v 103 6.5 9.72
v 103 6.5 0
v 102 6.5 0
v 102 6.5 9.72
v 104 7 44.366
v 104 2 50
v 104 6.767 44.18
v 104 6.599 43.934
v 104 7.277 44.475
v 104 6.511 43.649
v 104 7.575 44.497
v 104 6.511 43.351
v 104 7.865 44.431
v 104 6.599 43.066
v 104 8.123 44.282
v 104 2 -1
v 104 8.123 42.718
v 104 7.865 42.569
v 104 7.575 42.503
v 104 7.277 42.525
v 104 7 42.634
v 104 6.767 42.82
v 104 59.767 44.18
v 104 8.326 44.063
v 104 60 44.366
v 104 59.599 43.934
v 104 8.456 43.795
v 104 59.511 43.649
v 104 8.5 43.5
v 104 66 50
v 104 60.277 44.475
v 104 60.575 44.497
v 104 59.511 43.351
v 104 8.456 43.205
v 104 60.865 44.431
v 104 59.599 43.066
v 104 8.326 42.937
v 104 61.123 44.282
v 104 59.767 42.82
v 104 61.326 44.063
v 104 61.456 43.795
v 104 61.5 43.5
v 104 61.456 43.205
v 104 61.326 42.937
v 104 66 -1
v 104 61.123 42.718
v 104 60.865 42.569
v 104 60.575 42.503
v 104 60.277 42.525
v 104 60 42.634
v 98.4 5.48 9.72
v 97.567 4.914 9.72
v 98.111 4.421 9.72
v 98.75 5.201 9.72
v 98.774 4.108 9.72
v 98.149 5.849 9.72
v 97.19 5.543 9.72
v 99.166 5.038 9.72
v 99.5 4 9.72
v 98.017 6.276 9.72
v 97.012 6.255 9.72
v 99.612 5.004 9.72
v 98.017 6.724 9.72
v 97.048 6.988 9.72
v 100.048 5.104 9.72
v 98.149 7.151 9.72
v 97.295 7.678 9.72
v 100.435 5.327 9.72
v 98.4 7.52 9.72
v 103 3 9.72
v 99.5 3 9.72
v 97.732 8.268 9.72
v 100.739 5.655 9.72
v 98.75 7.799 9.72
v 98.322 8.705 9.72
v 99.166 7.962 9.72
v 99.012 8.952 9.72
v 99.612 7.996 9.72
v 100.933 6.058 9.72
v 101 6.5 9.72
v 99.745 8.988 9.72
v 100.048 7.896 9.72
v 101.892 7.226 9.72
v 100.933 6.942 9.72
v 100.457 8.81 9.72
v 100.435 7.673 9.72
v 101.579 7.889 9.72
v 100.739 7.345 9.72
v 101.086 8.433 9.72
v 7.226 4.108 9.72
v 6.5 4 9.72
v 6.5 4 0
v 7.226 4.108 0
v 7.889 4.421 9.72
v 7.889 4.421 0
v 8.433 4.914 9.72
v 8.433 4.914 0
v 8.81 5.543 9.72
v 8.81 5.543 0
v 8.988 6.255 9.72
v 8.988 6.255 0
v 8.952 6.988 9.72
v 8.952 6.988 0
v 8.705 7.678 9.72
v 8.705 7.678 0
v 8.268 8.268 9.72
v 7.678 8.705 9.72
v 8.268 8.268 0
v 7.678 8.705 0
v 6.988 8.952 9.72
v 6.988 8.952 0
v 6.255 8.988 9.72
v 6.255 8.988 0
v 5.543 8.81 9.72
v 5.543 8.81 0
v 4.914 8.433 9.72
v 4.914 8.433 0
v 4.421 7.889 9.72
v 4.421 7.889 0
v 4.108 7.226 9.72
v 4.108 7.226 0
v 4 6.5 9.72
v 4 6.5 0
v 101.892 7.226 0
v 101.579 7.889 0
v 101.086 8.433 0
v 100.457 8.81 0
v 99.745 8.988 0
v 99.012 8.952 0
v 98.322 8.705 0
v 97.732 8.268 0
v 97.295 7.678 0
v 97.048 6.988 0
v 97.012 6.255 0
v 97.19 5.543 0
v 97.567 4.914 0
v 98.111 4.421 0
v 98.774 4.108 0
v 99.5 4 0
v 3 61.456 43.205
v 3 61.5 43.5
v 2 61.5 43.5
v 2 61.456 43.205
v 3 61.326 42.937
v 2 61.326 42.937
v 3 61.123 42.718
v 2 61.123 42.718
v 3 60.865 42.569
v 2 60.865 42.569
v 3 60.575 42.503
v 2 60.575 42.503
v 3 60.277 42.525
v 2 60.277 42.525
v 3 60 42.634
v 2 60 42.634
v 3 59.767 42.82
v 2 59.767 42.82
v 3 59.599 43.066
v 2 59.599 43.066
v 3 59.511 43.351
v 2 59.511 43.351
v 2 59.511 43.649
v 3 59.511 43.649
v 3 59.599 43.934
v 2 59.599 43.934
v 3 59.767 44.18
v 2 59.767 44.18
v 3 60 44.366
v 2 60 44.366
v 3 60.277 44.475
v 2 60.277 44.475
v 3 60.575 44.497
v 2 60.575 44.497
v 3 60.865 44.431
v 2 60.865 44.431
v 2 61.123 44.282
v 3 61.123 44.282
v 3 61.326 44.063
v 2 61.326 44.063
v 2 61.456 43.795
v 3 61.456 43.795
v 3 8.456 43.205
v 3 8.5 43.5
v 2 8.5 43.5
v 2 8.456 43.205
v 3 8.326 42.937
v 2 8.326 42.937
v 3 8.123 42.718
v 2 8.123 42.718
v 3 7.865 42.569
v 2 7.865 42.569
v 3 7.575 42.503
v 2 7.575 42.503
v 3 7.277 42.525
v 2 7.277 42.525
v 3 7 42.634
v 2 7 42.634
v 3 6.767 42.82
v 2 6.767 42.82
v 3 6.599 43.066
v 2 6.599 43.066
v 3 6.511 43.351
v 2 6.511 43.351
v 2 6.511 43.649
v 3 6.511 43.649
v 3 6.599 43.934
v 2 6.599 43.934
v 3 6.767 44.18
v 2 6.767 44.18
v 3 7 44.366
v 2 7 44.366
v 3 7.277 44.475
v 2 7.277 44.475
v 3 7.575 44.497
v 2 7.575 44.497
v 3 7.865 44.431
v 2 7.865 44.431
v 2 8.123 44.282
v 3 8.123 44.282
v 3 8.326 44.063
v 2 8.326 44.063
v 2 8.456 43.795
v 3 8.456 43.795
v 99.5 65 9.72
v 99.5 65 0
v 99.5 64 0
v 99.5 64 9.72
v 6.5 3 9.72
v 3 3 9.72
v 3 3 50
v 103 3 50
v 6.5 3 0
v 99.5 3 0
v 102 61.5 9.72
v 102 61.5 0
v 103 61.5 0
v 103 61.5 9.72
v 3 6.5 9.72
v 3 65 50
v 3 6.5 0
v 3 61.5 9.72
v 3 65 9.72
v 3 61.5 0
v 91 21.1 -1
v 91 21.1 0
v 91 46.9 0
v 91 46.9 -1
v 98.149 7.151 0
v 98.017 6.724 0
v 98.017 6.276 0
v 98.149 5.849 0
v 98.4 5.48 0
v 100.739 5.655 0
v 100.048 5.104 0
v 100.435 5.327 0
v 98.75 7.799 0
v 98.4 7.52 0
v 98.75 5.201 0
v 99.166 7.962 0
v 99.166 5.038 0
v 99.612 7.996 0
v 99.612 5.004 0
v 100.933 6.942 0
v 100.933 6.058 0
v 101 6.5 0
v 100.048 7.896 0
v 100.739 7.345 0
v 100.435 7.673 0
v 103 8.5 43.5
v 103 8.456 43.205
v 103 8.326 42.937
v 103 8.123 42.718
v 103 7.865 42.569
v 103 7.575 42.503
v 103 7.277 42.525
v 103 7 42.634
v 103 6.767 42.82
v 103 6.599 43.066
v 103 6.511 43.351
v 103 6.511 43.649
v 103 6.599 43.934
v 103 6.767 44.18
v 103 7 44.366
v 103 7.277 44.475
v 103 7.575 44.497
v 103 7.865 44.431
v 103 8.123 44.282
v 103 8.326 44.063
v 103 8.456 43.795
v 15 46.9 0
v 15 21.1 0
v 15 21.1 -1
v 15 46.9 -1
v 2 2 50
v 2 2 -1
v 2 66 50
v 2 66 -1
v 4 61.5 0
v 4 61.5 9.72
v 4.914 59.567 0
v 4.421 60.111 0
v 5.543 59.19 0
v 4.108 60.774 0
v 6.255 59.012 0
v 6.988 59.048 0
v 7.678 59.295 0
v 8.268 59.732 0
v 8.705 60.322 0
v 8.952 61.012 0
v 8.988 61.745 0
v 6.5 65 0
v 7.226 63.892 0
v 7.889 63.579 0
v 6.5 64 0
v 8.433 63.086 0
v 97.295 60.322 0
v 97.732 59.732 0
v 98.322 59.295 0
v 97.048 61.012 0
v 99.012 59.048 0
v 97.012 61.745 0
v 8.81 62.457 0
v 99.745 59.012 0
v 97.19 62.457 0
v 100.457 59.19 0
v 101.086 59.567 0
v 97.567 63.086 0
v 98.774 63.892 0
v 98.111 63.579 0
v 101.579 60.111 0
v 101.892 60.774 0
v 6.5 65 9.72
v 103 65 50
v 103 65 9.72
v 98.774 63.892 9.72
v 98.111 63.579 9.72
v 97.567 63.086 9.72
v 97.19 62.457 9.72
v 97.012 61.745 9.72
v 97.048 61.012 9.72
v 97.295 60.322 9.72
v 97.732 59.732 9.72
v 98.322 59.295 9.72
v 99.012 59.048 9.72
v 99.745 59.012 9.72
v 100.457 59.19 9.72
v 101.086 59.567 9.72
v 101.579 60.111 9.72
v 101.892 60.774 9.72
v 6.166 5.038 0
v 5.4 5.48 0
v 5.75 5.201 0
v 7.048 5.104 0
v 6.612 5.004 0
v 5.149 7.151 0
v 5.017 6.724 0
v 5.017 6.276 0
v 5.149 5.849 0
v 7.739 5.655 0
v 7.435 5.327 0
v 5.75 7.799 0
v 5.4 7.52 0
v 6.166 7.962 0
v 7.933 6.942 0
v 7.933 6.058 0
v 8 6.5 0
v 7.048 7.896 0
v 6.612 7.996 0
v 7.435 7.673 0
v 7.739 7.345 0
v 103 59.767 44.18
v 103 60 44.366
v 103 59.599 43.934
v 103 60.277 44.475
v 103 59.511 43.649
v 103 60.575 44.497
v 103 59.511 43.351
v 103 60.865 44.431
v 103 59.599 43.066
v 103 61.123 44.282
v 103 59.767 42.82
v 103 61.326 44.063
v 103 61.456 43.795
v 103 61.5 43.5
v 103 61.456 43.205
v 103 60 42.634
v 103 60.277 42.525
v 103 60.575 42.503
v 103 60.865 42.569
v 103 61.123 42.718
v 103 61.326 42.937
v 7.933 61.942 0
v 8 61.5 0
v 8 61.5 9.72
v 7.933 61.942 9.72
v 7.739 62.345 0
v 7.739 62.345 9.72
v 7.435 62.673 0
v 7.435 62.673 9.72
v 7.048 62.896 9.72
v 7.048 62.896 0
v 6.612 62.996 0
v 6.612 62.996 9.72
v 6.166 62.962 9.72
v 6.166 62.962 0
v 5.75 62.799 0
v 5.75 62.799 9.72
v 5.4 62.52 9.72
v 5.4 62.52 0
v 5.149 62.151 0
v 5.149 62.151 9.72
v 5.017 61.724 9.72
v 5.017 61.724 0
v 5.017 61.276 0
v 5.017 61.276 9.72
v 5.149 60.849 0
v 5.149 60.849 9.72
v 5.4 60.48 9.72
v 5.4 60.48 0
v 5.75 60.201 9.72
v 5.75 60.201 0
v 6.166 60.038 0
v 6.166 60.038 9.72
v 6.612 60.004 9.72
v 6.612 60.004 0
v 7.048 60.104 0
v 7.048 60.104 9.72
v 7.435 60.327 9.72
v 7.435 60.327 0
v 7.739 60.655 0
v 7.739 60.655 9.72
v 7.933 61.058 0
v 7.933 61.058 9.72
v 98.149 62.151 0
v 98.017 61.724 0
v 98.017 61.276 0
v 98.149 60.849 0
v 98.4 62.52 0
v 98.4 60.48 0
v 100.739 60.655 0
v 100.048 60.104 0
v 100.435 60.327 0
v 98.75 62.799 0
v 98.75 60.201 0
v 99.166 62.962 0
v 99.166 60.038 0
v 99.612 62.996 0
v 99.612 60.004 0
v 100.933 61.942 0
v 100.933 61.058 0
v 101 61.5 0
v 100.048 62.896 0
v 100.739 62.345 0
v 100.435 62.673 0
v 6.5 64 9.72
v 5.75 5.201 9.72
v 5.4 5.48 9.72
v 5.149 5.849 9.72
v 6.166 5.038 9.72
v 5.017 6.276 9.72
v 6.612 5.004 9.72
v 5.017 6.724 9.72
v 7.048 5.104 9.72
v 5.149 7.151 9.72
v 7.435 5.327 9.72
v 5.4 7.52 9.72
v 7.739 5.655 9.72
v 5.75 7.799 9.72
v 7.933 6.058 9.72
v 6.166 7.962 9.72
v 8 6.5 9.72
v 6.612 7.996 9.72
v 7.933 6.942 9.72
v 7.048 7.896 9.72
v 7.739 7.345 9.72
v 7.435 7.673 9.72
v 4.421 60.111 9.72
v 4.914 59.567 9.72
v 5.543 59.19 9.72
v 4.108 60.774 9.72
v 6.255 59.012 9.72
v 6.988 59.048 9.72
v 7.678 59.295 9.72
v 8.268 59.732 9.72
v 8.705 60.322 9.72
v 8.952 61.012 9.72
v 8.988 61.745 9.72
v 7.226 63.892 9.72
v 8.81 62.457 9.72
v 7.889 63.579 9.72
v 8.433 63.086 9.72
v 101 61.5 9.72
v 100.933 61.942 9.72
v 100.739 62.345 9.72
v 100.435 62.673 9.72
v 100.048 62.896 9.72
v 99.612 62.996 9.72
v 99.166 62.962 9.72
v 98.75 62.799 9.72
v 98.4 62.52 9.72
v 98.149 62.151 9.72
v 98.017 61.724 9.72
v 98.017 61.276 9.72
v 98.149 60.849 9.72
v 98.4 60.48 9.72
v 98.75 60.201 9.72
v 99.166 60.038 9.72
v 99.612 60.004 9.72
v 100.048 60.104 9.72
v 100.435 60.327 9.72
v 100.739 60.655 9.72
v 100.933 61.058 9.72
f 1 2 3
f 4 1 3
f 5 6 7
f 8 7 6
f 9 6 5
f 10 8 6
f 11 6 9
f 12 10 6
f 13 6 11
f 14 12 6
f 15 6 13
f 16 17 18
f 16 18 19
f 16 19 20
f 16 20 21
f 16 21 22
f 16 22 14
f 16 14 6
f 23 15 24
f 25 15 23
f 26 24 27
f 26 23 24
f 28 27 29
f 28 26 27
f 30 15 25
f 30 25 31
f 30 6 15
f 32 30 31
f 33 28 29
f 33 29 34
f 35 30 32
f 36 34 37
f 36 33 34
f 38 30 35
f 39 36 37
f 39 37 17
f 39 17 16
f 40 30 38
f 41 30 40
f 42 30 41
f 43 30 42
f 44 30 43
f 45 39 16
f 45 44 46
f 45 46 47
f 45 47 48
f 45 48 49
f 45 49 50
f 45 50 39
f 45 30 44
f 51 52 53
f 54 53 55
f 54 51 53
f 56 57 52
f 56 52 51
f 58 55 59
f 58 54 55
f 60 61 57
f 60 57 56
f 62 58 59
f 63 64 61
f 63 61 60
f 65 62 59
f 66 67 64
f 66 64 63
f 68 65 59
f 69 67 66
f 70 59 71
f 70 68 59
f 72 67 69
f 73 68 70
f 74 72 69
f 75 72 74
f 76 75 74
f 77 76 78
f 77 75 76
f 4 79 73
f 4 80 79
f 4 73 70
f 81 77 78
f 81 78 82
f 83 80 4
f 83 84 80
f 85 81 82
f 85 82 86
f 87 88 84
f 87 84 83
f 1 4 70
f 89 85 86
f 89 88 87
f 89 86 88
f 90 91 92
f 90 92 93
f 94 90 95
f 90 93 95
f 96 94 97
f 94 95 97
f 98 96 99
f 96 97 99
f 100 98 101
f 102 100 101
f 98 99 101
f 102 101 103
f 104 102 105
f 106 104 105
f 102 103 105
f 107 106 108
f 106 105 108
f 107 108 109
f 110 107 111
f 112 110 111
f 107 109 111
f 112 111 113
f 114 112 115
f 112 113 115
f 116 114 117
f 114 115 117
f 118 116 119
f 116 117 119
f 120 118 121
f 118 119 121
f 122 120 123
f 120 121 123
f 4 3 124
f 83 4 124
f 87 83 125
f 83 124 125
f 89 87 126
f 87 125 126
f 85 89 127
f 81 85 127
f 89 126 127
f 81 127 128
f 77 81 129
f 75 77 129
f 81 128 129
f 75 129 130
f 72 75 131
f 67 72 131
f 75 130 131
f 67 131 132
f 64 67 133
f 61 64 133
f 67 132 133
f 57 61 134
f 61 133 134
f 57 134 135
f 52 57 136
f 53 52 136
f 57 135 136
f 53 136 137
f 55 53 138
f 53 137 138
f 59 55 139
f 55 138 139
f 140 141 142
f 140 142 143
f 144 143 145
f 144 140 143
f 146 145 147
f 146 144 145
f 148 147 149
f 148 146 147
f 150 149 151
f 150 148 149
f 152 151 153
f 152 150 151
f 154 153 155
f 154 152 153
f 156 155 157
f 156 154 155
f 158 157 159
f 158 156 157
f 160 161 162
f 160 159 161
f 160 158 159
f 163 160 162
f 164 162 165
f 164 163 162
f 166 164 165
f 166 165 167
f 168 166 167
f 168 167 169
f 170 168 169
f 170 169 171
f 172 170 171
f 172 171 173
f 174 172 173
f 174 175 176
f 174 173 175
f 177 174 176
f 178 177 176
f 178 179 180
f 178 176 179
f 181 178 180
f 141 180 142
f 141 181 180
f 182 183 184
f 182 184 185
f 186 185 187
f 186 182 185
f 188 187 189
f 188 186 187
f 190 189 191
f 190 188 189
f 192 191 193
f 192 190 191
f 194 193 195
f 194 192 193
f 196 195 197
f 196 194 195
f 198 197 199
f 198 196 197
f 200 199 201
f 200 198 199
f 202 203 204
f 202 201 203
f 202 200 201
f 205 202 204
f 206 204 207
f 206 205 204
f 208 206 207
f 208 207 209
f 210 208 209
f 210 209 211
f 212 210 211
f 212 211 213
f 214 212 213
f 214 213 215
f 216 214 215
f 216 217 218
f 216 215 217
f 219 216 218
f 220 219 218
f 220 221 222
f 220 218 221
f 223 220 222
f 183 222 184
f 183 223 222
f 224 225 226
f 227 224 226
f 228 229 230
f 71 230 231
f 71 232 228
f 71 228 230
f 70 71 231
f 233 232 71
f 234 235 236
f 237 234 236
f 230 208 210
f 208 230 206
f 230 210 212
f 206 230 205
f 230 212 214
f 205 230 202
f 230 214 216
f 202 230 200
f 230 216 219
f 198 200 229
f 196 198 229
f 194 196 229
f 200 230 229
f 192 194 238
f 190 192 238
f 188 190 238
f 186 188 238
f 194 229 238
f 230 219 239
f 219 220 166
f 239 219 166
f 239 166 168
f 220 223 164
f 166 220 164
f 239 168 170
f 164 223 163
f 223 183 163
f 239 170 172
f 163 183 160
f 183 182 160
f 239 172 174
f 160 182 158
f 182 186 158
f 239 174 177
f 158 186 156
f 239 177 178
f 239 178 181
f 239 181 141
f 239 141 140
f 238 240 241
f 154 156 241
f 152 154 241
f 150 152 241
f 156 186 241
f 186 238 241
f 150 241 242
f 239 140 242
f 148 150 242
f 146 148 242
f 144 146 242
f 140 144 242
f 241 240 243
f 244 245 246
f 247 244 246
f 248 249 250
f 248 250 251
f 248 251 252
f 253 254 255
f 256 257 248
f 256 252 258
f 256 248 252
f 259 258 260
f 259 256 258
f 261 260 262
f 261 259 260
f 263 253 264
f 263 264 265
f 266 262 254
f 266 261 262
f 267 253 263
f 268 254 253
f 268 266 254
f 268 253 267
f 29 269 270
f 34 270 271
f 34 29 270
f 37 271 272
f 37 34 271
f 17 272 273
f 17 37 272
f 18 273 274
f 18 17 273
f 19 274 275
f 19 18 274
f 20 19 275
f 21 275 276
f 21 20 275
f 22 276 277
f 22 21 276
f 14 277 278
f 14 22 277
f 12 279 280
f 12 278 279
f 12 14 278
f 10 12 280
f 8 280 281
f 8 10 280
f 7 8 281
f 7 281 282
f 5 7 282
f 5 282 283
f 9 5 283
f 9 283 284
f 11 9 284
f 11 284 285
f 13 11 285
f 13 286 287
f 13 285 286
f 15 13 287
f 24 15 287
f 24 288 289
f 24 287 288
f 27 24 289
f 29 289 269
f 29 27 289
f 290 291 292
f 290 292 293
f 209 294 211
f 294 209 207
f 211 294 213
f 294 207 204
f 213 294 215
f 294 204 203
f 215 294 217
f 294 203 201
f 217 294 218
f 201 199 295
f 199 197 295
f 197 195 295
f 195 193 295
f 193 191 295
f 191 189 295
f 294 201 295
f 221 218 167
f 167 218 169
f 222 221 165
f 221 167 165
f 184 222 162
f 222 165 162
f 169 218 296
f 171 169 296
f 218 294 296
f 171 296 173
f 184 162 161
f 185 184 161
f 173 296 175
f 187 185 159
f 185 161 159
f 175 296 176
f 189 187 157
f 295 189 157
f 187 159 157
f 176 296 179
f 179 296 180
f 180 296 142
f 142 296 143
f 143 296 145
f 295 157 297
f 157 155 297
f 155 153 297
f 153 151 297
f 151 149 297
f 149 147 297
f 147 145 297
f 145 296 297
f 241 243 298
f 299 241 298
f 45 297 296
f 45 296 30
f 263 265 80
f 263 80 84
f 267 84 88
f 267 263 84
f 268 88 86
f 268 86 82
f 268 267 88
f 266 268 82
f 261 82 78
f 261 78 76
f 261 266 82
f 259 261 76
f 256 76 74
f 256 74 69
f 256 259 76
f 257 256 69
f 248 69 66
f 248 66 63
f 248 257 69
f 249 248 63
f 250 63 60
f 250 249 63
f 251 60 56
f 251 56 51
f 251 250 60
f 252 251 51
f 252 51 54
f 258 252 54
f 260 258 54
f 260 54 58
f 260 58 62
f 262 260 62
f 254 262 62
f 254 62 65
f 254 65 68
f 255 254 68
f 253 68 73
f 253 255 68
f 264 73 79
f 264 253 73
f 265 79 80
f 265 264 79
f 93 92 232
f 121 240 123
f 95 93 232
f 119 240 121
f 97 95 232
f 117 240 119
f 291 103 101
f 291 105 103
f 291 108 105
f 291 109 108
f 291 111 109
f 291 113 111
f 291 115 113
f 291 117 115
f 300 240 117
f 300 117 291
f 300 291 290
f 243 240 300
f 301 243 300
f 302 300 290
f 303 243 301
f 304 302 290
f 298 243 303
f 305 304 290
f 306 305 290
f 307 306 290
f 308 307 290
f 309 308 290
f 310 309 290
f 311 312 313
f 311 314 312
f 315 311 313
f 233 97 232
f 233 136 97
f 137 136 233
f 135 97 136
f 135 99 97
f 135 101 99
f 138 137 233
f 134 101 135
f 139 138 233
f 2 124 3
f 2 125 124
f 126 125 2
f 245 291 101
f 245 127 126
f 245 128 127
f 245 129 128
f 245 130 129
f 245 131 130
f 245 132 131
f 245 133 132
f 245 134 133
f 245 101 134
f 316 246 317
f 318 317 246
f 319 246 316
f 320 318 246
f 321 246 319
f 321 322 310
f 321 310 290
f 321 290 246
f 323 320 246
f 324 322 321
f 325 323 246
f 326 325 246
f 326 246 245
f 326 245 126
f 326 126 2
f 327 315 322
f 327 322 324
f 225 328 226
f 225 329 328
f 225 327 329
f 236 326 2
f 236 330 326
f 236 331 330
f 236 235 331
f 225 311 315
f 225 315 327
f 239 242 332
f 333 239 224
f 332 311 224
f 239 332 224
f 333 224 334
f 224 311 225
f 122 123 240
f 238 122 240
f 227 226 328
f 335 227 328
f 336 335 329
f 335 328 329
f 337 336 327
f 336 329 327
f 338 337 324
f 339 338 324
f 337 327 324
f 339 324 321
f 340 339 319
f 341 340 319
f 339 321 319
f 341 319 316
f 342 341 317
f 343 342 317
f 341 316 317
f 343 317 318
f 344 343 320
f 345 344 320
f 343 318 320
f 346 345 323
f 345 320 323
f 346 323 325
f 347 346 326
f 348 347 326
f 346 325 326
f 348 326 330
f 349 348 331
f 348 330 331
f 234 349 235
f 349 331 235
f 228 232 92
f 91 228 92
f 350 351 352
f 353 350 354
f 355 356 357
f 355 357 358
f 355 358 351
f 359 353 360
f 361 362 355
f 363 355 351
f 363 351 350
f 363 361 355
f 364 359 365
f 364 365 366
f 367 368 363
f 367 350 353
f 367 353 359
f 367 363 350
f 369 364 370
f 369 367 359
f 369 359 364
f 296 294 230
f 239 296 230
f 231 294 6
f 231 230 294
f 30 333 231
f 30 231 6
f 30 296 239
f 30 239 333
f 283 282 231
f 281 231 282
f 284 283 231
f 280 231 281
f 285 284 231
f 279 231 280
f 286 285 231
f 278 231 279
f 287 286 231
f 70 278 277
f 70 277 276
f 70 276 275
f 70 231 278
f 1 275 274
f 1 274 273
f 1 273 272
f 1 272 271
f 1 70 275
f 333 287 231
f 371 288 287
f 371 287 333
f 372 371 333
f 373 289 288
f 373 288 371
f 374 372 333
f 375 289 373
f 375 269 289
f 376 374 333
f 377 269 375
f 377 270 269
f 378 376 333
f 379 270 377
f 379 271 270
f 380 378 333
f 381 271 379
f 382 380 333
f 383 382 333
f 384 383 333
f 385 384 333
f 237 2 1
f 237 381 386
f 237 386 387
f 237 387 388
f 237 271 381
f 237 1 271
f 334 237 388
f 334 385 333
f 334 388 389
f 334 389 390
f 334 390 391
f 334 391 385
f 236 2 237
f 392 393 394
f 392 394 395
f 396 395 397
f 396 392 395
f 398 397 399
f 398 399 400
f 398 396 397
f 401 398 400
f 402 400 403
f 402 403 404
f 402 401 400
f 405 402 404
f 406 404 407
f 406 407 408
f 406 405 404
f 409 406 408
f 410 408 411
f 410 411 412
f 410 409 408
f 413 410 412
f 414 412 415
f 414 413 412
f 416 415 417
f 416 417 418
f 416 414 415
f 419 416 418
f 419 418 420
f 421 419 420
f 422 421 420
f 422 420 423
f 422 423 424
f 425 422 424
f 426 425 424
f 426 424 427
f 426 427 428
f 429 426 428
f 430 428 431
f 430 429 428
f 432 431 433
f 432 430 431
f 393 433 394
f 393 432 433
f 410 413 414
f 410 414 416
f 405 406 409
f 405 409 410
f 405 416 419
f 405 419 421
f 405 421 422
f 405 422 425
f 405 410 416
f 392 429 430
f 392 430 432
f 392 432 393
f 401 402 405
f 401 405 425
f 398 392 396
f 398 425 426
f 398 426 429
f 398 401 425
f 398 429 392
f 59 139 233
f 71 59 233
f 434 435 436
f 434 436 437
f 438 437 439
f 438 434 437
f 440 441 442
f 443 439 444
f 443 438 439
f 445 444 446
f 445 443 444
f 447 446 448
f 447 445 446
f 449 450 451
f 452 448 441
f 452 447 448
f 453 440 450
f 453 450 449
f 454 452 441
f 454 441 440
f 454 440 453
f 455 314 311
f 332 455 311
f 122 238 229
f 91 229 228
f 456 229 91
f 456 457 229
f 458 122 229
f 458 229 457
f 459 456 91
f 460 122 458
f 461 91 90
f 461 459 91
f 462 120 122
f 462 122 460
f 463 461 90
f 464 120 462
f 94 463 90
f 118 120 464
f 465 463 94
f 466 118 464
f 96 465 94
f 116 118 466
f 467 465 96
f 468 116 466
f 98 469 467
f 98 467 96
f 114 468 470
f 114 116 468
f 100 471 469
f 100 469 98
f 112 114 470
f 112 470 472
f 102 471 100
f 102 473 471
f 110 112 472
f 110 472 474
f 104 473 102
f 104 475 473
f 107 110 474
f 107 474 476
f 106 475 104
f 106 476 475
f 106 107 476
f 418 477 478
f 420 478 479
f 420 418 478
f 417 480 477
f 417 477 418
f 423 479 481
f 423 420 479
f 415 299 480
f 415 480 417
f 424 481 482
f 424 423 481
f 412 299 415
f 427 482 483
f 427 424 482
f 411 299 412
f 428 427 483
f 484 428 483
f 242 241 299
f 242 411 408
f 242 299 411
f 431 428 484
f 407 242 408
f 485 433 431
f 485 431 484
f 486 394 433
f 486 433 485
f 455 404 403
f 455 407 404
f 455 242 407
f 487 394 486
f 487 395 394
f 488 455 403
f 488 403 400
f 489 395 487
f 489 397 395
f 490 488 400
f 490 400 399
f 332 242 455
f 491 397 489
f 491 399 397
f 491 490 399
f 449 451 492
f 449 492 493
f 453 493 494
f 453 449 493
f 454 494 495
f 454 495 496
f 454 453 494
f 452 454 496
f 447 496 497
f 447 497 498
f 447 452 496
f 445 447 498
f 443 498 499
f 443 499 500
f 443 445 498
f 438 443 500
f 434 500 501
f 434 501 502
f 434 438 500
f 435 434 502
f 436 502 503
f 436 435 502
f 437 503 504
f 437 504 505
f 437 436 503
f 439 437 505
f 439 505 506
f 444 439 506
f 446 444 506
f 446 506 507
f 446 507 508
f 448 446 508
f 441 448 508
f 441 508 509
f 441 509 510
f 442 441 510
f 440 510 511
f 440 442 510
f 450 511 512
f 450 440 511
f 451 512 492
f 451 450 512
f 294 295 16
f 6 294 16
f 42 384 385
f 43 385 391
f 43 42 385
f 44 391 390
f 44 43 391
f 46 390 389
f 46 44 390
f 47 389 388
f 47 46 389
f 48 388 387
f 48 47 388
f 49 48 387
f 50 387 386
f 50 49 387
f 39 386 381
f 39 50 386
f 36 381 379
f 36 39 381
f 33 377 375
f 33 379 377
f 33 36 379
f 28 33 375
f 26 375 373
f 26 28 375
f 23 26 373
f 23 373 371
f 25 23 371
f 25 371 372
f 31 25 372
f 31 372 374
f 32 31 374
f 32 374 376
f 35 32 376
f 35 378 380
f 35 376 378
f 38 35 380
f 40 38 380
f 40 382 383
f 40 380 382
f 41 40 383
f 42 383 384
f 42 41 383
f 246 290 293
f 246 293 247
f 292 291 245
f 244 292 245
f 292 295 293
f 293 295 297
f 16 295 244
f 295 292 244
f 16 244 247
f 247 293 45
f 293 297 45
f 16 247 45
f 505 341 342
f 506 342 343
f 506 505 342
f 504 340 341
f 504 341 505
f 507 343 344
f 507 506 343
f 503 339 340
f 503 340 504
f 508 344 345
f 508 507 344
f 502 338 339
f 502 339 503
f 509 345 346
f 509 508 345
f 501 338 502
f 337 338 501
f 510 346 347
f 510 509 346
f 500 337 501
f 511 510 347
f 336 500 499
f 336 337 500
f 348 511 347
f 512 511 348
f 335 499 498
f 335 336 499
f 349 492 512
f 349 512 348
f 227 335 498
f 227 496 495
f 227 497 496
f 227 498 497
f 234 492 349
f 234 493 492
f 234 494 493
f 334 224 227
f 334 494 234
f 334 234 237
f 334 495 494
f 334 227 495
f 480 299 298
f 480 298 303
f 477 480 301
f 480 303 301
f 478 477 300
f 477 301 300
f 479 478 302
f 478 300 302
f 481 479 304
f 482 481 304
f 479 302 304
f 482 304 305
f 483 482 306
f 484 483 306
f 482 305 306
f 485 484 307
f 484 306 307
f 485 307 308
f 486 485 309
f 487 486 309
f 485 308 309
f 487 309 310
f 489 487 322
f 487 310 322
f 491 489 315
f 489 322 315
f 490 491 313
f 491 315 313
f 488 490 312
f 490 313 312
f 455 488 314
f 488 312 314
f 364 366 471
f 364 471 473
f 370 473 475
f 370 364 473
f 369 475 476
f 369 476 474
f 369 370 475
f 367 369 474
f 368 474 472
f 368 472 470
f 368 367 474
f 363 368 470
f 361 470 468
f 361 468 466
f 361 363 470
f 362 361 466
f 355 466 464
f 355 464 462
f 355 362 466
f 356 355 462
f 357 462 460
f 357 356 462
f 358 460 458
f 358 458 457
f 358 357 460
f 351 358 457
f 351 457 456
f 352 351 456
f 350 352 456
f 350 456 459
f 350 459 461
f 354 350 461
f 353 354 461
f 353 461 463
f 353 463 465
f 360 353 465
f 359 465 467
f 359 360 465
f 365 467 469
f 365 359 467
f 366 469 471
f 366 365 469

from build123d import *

# Parameters (mm, degrees)
SKETCH_1_W               = 102
SKETCH_1_H               = 64
EXTRUDE_1_DEPTH          = 50
SKETCH_1_3_R             = 1.5
EXTRUDE_2_DEPTH          = 9.72
SKETCH_4_W               = 102
SKETCH_4_H               = 1
EXTRUDE_3_DEPTH          = 64
SKETCH_1_5_W             = 76
SKETCH_1_5_H             = 25.8
CUT_EXTRUDE_1_DEPTH      = 1
CUT_EXTRUDE_2_DEPTH      = 102
CUT_EXTRUDE_2_DEPTH_BACK = 1
SKETCH_5_R               = 1


with BuildPart() as part:
    # Эскиз1 → Бобышка-Вытянуть1 (new body)
    with BuildSketch(Plane.XY):
        with Locations((53, 34)):
            Rectangle(SKETCH_1_W, SKETCH_1_H)
        Polygon((3, 61.5), (3, 65), (6.5, 65), (99.5, 65), (103, 65), (103, 61.5), (103, 6.5), (103, 3), (99.5, 3), (6.5, 3), (3, 3), (3, 6.5), align=None, mode=Mode.SUBTRACT)
    extrude(amount=EXTRUDE_1_DEPTH)

    # Эскиз1<3> → Бобышка-Вытянуть2 (add)
    # profile 1 of 4: a face of its own
    with BuildSketch(Plane.XY):
        with BuildLine():
            Line((6.5, 65), (3, 65))
            Line((3, 65), (3, 61.5))
            Line((3, 61.5), (4, 61.5))
            ThreePointArc((4, 61.5), (8.267766953, 59.732233047), (6.5, 64))
            Line((6.5, 64), (6.5, 65))
        make_face()
        with Locations((6.5, 61.5)):
            Circle(SKETCH_1_3_R, mode=Mode.SUBTRACT)
    # profile 2 of 4: a face of its own
    with BuildSketch(Plane.XY):
        with BuildLine():
            Line((103, 65), (99.5, 65))
            Line((99.5, 65), (99.5, 64))
            ThreePointArc((99.5, 64), (97.732233047, 59.732233047), (102, 61.5))
            Line((102, 61.5), (103, 61.5))
            Line((103, 61.5), (103, 65))
        make_face()
        with Locations((99.5, 61.5)):
            Circle(SKETCH_1_3_R, mode=Mode.SUBTRACT)
    # profile 3 of 4: a face of its own
    with BuildSketch(Plane.XY):
        with BuildLine():
            Line((4, 6.5), (3, 6.5))
            Line((3, 6.5), (3, 3))
            Line((3, 3), (6.5, 3))
            Line((6.5, 3), (6.5, 4))
            ThreePointArc((6.5, 4), (8.267766953, 8.267766953), (4, 6.5))
        make_face()
        with Locations((6.5, 6.5)):
            Circle(SKETCH_1_3_R, mode=Mode.SUBTRACT)
    # profile 4 of 4: a face of its own
    with BuildSketch(Plane.XY):
        with BuildLine():
            Line((103, 3), (103, 6.5))
            Line((103, 6.5), (102, 6.5))
            ThreePointArc((102, 6.5), (97.732233047, 8.267766953), (99.5, 4))
            Line((99.5, 4), (99.5, 3))
            Line((99.5, 3), (103, 3))
        make_face()
        with Locations((99.5, 6.5)):
            Circle(SKETCH_1_3_R, mode=Mode.SUBTRACT)
    extrude(amount=EXTRUDE_2_DEPTH)

    # Эскиз4 → Бобышка-Вытянуть3 (add)
    with BuildSketch(Plane(origin=(0, 66, 0), x_dir=(1, 0, 0), z_dir=(0, 1, 0))):
        with Locations((53, 0.5)):
            Rectangle(SKETCH_4_W, SKETCH_4_H)
    extrude(amount=-EXTRUDE_3_DEPTH)

    # Эскиз1<5> → Вырез-Вытянуть1 (cut)
    with BuildSketch(Plane.XY):
        with Locations((53, 34)):
            Rectangle(SKETCH_1_5_W, SKETCH_1_5_H)
    extrude(amount=-CUT_EXTRUDE_1_DEPTH, mode=Mode.SUBTRACT)

    # Эскиз5 → Вырез-Вытянуть2 (cut, two sides: drawn at the far end of the back side and taken through both)
    with BuildSketch(Plane.ZY.offset(-103).offset(-CUT_EXTRUDE_2_DEPTH_BACK)):
        with Locations((43.5, 7.5)):
            Circle(SKETCH_5_R)
        with Locations((43.5, 60.5)):
            Circle(SKETCH_5_R)
    extrude(amount=CUT_EXTRUDE_2_DEPTH + CUT_EXTRUDE_2_DEPTH_BACK, mode=Mode.SUBTRACT)


solid = part.part
